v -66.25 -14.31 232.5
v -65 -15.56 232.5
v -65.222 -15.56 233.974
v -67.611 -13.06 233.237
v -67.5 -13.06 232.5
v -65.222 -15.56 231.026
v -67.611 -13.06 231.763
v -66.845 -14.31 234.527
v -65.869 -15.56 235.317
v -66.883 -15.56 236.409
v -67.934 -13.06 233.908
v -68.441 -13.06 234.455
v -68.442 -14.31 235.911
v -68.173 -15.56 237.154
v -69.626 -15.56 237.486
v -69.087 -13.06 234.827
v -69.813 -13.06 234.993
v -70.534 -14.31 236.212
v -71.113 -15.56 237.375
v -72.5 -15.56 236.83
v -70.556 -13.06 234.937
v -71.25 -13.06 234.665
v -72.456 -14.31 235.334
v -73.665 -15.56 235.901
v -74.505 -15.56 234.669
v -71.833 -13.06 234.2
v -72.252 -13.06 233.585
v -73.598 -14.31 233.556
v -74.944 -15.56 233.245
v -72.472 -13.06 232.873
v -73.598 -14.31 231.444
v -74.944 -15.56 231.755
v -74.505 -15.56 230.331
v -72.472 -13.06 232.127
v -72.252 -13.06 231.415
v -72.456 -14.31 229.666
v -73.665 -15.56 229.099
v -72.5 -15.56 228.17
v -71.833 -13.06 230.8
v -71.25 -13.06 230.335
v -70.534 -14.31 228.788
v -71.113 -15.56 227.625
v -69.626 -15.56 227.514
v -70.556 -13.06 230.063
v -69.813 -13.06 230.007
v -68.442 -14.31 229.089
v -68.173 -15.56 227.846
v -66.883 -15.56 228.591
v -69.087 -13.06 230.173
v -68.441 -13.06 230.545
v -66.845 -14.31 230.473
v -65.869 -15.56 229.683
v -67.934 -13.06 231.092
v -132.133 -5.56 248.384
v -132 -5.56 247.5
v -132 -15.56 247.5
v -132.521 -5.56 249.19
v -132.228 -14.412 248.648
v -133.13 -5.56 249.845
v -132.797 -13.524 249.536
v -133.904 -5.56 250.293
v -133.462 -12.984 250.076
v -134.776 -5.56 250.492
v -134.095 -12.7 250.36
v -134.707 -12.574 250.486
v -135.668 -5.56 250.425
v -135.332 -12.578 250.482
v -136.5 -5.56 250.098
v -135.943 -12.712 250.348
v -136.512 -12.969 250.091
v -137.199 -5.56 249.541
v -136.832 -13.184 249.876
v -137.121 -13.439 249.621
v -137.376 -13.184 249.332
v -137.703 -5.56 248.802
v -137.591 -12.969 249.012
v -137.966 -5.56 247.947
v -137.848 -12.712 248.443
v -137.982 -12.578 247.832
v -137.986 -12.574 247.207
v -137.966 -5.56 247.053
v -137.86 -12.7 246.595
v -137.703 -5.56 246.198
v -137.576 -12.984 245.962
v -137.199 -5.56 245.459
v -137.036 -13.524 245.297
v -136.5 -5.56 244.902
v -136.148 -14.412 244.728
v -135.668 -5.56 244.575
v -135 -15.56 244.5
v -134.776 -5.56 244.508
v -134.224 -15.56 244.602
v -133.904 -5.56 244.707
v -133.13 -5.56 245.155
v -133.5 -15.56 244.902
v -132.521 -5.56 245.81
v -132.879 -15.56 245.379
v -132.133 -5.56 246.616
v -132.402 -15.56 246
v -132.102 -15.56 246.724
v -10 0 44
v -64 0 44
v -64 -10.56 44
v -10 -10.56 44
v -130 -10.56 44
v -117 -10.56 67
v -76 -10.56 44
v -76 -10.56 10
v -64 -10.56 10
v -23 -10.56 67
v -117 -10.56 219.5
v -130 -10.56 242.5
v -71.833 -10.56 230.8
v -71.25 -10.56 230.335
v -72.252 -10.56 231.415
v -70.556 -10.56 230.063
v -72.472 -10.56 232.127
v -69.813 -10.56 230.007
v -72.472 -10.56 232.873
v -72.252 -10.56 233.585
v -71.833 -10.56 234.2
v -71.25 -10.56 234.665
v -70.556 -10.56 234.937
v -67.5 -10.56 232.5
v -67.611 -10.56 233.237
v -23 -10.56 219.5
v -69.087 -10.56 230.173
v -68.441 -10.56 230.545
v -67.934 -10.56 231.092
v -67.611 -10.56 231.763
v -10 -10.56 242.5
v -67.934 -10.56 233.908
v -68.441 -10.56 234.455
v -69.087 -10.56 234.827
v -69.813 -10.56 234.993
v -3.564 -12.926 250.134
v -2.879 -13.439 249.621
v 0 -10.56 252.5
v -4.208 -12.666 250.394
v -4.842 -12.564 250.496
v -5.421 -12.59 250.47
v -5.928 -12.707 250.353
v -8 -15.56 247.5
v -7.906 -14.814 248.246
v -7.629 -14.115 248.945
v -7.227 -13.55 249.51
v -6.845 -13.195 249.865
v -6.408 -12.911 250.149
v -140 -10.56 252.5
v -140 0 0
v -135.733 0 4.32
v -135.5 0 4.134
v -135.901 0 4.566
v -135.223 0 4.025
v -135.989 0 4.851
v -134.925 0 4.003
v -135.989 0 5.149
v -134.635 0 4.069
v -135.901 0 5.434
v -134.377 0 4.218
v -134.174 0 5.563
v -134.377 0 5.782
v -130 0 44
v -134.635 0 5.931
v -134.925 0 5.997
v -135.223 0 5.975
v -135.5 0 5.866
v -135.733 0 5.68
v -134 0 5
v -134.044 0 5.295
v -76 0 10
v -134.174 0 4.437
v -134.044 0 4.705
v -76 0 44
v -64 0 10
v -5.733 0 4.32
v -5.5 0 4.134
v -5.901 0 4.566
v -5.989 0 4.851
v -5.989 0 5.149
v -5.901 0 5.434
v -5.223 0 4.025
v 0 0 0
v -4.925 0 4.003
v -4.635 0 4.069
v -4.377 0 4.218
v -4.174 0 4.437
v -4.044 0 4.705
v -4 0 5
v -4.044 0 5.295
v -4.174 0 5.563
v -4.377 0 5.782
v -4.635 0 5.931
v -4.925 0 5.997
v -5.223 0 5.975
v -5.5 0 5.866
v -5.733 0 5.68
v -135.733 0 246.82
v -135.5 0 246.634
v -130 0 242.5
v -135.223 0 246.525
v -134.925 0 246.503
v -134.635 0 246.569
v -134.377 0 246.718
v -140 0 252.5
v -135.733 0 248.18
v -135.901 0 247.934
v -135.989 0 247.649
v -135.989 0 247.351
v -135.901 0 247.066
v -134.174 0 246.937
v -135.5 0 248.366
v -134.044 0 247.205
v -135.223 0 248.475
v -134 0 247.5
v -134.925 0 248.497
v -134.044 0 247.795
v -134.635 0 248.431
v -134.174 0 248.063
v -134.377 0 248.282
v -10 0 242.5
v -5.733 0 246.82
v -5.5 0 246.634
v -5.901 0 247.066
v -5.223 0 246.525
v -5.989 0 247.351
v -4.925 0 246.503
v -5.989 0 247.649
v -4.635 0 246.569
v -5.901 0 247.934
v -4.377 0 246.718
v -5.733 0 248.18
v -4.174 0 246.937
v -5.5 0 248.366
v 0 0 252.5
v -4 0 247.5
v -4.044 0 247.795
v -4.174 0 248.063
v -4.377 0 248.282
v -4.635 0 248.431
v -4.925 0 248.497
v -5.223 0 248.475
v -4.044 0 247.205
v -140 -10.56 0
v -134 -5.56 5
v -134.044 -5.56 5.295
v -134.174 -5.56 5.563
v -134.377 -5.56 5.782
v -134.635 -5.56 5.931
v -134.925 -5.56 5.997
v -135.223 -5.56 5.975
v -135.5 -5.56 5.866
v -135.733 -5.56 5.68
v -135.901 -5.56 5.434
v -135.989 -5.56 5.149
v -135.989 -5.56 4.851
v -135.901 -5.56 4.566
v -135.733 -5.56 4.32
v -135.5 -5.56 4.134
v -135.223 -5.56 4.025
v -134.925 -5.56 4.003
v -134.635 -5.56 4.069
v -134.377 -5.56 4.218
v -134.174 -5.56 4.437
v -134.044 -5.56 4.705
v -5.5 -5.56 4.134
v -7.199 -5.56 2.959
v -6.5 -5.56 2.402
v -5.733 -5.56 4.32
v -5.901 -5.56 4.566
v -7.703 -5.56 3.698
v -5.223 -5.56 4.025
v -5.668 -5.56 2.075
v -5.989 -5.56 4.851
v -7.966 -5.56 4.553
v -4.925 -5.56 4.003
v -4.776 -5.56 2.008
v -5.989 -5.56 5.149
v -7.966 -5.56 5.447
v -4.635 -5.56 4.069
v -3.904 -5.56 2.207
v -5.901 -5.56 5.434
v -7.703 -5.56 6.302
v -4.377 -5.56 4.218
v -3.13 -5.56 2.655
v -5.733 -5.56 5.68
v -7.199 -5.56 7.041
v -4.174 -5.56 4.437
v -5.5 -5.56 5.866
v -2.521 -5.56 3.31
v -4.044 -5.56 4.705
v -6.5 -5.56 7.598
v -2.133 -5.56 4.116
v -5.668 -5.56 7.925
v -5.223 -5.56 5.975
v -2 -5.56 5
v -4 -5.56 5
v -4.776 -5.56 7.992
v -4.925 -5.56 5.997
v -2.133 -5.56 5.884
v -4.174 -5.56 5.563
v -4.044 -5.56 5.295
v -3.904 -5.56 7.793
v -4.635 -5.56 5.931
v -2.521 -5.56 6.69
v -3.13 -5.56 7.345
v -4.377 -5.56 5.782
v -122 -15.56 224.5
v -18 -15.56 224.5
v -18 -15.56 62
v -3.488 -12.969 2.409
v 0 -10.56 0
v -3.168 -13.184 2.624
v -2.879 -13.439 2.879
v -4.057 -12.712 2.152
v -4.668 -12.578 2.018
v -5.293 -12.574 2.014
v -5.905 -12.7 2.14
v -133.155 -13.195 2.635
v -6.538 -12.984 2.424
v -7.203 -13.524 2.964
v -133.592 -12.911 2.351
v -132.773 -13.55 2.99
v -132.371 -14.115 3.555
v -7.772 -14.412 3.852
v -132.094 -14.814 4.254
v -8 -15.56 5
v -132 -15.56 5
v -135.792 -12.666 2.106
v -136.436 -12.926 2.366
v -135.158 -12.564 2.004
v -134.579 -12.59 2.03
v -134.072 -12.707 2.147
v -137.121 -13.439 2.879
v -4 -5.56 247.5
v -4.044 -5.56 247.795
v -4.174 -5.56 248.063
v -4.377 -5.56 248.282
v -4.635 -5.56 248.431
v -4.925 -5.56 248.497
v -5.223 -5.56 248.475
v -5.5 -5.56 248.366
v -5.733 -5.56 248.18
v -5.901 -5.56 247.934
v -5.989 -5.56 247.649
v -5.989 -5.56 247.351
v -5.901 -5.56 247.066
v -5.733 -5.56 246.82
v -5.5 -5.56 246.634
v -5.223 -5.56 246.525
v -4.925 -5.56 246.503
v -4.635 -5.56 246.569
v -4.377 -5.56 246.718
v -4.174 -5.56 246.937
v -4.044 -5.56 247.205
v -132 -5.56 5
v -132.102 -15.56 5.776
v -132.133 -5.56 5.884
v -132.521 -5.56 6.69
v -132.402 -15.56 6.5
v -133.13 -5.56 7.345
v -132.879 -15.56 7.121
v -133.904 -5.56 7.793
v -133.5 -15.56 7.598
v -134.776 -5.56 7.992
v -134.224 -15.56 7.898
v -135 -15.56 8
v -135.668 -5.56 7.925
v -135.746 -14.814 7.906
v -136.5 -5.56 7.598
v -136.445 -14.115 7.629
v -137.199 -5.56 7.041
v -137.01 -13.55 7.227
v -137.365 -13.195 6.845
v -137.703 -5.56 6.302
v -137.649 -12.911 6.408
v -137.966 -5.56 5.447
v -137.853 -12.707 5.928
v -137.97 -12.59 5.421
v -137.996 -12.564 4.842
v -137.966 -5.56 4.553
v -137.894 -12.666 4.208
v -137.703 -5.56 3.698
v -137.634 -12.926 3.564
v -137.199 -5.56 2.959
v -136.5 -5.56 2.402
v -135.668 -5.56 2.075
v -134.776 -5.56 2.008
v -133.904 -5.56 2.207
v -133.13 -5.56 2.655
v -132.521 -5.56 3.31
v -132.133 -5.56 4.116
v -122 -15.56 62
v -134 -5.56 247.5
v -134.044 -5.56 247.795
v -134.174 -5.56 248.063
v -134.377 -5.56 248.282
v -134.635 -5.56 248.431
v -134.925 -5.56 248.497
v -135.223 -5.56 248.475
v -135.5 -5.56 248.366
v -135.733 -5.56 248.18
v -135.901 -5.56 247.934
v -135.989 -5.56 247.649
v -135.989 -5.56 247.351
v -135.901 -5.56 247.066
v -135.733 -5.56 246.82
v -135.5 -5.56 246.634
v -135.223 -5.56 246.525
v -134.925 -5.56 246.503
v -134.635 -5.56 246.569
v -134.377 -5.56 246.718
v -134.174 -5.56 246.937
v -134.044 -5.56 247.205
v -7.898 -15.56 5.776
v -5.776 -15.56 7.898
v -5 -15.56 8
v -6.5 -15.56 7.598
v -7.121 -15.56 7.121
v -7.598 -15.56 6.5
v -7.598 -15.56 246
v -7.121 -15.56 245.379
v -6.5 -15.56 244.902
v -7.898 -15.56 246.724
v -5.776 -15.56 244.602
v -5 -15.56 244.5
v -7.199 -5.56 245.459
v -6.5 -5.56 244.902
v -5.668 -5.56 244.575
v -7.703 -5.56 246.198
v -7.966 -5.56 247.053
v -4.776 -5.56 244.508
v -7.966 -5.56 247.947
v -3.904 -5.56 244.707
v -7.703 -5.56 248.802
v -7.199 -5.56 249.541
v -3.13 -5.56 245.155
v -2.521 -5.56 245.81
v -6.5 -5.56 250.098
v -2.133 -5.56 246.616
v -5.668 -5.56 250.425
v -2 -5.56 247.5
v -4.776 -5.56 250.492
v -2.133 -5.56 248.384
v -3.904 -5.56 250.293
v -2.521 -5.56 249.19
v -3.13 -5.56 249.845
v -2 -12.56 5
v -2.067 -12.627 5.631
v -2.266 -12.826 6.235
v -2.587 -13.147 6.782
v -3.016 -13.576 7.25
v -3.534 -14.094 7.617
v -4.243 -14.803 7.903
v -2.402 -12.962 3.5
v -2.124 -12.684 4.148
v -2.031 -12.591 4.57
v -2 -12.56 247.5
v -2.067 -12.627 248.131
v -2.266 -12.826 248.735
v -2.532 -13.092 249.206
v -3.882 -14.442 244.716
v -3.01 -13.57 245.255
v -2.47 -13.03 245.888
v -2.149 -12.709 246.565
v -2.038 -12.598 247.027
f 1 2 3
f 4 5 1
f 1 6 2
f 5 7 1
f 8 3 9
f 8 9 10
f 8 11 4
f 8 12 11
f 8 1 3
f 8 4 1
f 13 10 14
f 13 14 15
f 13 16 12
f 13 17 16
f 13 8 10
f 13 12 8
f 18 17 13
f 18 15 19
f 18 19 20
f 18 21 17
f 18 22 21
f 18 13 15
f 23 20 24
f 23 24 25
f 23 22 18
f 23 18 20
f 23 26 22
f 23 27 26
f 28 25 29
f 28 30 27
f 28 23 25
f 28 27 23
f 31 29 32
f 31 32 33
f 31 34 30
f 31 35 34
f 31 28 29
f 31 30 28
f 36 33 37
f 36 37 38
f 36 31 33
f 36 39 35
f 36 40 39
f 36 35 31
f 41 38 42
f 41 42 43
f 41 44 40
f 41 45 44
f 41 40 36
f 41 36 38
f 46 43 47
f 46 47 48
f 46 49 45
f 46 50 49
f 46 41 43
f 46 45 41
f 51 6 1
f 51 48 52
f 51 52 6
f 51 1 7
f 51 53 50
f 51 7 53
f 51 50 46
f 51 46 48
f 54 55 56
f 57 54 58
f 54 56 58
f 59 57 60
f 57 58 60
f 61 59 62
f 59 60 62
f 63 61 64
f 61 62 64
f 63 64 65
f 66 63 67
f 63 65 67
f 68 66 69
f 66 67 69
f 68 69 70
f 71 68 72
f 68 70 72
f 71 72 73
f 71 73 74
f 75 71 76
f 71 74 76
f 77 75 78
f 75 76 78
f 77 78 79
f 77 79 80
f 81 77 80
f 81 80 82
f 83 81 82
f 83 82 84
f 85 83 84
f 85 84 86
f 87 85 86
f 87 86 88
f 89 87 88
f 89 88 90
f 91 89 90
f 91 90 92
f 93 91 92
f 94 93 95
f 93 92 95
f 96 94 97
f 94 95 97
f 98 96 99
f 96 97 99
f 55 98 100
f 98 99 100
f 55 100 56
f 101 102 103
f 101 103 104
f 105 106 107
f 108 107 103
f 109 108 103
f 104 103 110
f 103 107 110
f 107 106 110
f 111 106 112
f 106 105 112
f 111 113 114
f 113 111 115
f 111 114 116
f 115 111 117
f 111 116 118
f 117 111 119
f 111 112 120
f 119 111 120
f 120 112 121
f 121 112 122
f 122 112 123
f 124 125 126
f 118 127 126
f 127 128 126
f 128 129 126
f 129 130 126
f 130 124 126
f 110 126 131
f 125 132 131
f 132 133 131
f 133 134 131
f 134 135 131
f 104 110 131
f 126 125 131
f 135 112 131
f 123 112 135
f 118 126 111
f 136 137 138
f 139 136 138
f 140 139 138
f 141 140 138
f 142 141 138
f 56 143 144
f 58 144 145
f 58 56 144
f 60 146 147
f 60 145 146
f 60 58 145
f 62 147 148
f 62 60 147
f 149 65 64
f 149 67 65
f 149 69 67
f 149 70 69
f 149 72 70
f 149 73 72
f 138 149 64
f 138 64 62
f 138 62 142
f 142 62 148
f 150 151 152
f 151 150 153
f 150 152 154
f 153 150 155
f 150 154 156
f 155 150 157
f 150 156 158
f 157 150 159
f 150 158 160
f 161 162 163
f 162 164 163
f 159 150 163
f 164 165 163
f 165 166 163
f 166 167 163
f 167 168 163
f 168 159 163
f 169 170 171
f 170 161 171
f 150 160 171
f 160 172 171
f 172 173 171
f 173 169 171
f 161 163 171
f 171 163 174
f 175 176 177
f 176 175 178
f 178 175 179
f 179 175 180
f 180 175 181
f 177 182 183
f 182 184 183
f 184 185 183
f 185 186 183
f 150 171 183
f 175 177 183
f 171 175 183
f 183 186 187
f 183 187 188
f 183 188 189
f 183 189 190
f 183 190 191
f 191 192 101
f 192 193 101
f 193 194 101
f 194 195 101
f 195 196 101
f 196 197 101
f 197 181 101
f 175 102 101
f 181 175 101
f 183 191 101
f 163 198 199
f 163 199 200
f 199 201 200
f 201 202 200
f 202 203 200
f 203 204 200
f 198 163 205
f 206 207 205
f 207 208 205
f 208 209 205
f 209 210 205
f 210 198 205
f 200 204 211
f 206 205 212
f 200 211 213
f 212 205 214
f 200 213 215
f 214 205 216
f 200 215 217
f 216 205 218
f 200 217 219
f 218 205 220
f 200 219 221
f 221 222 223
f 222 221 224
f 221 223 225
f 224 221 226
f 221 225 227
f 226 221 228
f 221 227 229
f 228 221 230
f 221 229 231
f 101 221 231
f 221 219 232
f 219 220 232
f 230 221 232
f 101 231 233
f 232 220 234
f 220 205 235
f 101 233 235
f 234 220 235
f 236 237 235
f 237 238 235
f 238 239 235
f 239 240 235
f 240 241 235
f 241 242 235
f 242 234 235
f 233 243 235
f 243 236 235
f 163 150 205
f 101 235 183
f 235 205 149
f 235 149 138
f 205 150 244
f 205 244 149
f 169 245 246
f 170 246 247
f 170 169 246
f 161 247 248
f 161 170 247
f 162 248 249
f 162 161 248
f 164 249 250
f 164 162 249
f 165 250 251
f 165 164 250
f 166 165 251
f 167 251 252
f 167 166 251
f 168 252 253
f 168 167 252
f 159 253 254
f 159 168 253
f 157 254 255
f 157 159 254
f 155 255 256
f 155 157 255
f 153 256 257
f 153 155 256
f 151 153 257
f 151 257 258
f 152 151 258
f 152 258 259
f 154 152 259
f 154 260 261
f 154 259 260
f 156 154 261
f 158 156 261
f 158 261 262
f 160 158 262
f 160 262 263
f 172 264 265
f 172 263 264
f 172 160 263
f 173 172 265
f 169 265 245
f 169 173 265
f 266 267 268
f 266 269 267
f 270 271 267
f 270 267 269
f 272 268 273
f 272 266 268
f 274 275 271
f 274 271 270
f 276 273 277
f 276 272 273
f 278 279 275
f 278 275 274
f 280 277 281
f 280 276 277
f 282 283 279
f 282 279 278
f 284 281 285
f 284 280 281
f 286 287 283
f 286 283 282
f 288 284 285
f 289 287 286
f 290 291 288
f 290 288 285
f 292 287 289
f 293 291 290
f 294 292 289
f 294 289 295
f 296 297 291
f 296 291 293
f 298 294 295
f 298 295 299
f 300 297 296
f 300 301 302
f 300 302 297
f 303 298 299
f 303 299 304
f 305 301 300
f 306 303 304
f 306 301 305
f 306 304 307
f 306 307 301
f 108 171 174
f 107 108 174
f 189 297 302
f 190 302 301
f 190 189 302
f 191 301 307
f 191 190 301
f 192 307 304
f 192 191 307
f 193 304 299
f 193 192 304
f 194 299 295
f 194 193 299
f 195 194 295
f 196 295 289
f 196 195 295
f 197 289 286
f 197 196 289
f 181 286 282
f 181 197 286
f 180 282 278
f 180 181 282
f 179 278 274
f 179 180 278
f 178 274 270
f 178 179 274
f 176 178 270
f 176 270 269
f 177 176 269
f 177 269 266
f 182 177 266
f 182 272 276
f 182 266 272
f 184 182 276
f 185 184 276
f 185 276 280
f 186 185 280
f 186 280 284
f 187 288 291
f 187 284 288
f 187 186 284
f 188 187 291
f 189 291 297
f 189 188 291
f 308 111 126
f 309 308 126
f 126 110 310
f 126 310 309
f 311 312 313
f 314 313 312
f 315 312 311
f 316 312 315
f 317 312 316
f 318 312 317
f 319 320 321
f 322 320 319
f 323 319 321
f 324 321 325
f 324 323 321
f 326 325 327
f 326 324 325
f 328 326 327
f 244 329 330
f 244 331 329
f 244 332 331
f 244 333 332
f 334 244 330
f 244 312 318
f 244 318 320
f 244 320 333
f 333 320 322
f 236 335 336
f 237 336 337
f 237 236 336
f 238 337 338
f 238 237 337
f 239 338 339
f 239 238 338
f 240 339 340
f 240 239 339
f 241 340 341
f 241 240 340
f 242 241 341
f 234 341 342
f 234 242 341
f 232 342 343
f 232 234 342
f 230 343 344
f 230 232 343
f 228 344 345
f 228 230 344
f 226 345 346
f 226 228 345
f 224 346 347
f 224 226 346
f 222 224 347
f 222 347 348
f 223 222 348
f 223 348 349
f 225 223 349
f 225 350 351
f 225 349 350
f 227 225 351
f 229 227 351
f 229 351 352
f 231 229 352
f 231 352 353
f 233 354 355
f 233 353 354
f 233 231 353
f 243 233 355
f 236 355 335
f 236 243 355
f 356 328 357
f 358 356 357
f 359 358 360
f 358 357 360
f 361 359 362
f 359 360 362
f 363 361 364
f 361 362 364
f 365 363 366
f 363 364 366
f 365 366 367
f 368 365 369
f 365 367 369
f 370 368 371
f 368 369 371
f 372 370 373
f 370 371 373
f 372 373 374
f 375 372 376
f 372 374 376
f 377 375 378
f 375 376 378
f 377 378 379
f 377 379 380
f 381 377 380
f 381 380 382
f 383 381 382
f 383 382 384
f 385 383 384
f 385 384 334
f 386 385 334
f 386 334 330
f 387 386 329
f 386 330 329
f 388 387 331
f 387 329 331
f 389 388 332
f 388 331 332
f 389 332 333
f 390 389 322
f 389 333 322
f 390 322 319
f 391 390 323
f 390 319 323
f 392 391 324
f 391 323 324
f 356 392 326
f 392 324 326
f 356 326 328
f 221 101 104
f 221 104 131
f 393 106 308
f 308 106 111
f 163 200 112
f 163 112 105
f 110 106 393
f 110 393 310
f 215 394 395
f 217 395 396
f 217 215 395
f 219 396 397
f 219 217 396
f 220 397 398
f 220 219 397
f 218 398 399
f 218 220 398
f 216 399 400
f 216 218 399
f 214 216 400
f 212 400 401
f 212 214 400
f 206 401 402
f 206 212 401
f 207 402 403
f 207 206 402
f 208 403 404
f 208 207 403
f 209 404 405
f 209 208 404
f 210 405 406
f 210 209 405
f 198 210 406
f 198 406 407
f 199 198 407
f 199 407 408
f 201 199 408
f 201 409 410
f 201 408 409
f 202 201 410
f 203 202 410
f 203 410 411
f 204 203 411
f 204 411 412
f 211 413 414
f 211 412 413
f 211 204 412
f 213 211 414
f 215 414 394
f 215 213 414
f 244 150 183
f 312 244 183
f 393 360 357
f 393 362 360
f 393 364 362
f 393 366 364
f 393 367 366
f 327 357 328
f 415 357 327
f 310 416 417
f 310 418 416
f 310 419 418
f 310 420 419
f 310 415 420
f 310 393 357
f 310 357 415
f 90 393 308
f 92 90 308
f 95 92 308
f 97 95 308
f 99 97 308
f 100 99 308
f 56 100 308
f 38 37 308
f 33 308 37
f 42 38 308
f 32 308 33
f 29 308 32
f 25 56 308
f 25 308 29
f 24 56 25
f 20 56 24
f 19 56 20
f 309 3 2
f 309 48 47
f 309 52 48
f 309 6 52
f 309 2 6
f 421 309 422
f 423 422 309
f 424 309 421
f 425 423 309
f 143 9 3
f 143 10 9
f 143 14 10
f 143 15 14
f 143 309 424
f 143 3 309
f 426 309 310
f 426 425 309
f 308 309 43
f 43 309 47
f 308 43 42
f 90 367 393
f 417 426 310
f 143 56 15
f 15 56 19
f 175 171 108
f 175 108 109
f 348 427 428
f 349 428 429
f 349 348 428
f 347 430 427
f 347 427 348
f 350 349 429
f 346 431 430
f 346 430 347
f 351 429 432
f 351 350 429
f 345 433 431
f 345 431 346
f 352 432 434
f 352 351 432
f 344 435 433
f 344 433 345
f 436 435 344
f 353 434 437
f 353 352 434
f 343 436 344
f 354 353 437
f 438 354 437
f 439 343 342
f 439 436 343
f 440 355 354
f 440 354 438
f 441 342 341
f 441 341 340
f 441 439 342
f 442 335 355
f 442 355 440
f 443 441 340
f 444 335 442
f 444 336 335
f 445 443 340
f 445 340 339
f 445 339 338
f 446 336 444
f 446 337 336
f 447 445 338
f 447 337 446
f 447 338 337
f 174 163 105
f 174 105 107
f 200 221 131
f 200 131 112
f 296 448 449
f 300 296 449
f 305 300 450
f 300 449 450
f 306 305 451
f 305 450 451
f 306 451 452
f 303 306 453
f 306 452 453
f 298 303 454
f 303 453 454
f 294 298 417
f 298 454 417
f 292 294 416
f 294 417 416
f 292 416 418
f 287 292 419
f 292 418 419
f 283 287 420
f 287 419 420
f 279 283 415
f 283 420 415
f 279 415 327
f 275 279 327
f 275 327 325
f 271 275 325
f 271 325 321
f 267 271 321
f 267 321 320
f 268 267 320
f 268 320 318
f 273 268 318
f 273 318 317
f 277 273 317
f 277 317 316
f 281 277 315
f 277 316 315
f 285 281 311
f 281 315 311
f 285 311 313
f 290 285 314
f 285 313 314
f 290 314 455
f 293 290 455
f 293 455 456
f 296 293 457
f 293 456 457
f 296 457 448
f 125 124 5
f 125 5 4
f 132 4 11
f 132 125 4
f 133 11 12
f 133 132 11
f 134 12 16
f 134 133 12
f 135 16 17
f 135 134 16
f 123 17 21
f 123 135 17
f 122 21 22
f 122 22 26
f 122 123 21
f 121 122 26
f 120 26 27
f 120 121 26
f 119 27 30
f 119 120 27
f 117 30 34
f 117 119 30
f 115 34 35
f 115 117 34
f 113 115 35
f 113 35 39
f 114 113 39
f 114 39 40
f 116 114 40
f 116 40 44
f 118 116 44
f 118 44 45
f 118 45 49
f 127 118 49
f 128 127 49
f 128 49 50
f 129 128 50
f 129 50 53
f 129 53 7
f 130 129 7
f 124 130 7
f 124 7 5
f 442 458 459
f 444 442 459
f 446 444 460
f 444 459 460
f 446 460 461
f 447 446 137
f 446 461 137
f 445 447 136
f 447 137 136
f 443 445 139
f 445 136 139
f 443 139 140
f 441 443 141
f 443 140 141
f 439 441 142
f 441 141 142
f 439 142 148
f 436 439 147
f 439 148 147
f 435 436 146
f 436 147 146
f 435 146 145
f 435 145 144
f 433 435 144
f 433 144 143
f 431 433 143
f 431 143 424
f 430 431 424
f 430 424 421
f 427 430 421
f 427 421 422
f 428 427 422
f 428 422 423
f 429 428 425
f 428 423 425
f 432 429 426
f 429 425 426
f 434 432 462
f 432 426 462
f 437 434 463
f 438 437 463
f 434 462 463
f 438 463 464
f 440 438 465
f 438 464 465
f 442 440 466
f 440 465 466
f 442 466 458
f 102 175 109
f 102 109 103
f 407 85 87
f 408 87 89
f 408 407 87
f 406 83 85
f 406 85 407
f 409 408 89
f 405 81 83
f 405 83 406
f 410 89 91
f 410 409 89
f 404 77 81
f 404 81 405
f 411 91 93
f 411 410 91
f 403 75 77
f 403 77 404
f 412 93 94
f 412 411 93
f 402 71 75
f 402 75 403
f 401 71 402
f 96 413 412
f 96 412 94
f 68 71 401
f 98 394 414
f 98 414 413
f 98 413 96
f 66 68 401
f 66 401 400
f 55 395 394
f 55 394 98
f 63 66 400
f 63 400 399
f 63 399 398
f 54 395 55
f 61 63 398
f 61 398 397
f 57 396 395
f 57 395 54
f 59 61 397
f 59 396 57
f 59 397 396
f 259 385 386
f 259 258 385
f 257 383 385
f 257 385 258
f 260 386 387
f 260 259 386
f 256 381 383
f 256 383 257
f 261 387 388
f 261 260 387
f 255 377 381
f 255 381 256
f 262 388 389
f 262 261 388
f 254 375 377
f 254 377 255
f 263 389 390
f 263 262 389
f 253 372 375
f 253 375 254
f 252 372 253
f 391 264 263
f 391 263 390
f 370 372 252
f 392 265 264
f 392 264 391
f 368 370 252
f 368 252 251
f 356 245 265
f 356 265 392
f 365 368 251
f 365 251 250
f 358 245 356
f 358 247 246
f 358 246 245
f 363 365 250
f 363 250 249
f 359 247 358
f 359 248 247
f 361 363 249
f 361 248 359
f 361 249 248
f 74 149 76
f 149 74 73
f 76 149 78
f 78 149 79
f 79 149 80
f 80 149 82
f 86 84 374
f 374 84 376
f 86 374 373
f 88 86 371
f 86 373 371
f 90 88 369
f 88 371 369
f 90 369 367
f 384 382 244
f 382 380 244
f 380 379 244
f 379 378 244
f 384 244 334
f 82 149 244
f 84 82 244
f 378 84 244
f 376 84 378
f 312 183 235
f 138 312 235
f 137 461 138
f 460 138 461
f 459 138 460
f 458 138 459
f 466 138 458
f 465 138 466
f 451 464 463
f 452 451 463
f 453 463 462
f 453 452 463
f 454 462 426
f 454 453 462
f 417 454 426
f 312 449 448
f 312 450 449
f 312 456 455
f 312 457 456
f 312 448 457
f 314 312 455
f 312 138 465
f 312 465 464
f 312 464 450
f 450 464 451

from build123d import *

# Parameters (mm, degrees)
F0_W        = 140
F0_H        = 252.5
F0_R        = 1
F0_W_2      = 94
F0_H_2      = 152.5
F0_R_2      = 2.5
F0_W_3      = 12
F0_H_3      = 34
F1_DEPTH    = 15.56
F2_DEPTH    = 10.56
F3_T1_DEPTH = 165.7168298797
F3_T3_DEPTH = 278.2168298797
F4_SIZE     = 2.5
F5_R        = 3
F6_DEPTH    = 10
F7_SIZE     = 4.99999


# Not quite as in the source:
# - a fillet or chamfer that OpenCascade refuses, or shapes differently, is made with other operations: its cross-section is extruded or revolved along the edge and cut away or added
# - a fillet or chamfer is up to 0.001 mm smaller than in the source, because OpenCascade refuses the exact size
# - a feature names something its author has since deleted; it is built from what else it names


with BuildPart() as f1:
    # F0 (on Front) → F1 (new body)
    with BuildSketch(Plane.XZ):
        with Locations((-70, 126.25)):
            Rectangle(F0_W, F0_H)
        with Locations((-135, 5)):
            Circle(F0_R, mode=Mode.SUBTRACT)
        with Locations((-5, 5)):
            Circle(F0_R, mode=Mode.SUBTRACT)
        with Locations((-135, 247.5)):
            Circle(F0_R, mode=Mode.SUBTRACT)
        Polygon((-130, 44), (-130, 242.5), (-10, 242.5), (-10, 44), (-64, 44), (-64, 10), (-76, 10), (-76, 44), align=None, mode=Mode.SUBTRACT)
        with Locations((-5, 247.5)):
            Circle(F0_R, mode=Mode.SUBTRACT)
        Polygon((-10, 242.5), (-130, 242.5), (-130, 44), (-76, 44), (-64, 44), (-10, 44), align=None)
        with Locations((-70, 143.25)):
            Rectangle(F0_W_2, F0_H_2, mode=Mode.SUBTRACT)
        with Locations((-70, 232.5)):
            Circle(F0_R_2, mode=Mode.SUBTRACT)
        with Locations((-70, 27)):
            Rectangle(F0_W_3, F0_H_3)
    extrude(amount=F1_DEPTH)

    # F0 (on Front) → F2 (cut)
    with BuildSketch(Plane.XZ):
        Polygon((-10, 242.5), (-130, 242.5), (-130, 44), (-76, 44), (-64, 44), (-10, 44), align=None)
        with Locations((-70, 143.25)):
            Rectangle(F0_W_2, F0_H_2, mode=Mode.SUBTRACT)
        with Locations((-70, 232.5)):
            Circle(F0_R_2, mode=Mode.SUBTRACT)
        with Locations((-70, 27)):
            Rectangle(F0_W_3, F0_H_3)
    extrude(amount=F2_DEPTH, mode=Mode.SUBTRACT)

    # F3: chamfer of 5 on 4 edges, made by hand

    # F3_s2 → F3_t1 (cut)
    with BuildSketch(Plane.YZ.offset(-152.8584149398)):
        Polygon((-10.56, 0), (-15.56, 5), (-15.56, 0), align=None)
        Polygon((-15.56, 247.5), (-10.56, 252.5), (-15.56, 252.5), align=None)
    extrude(amount=F3_T1_DEPTH, mode=Mode.SUBTRACT)

    # F3_s4 → F3_t3 (cut)
    with BuildSketch(Plane.XY.offset(-12.8584149398)):
        Polygon((-140, -10.56), (-135, -15.56), (-140, -15.56), align=None)
        Polygon((0, -10.56), (-5, -15.56), (0, -15.56), align=None)
    extrude(amount=F3_T3_DEPTH, mode=Mode.SUBTRACT)

    # F4
    f4_edges = [f1.edges().sort_by_distance(p)[0] for p in [
        (-72.5, -15.56, 232.5),
    ]]
    chamfer(f4_edges, length=F4_SIZE)

    # F5 (on face) → F6 (cut)
    with BuildSketch(Plane.XZ.offset(15.56)):
        with Locations((-135, 247.5)):
            Circle(F5_R)
        with Locations((-135, 5)):
            Circle(F5_R)
        with Locations((-5, 247.5)):
            Circle(F5_R)
        with Locations((-5, 5)):
            Circle(F5_R)
    extrude(amount=-F6_DEPTH, mode=Mode.SUBTRACT)

    # F7 (size 5 in the source; OpenCascade refuses exactly that, so slightly less here)
    f7_edges = [f1.edges().sort_by_distance(p)[0] for p in [
        (-70, -15.56, 67),
        (-117, -15.56, 143.25),
        (-23, -15.56, 143.25),
        (-70, -15.56, 219.5),
    ]]
    chamfer(f7_edges, length=F7_SIZE)


solid = f1.part
